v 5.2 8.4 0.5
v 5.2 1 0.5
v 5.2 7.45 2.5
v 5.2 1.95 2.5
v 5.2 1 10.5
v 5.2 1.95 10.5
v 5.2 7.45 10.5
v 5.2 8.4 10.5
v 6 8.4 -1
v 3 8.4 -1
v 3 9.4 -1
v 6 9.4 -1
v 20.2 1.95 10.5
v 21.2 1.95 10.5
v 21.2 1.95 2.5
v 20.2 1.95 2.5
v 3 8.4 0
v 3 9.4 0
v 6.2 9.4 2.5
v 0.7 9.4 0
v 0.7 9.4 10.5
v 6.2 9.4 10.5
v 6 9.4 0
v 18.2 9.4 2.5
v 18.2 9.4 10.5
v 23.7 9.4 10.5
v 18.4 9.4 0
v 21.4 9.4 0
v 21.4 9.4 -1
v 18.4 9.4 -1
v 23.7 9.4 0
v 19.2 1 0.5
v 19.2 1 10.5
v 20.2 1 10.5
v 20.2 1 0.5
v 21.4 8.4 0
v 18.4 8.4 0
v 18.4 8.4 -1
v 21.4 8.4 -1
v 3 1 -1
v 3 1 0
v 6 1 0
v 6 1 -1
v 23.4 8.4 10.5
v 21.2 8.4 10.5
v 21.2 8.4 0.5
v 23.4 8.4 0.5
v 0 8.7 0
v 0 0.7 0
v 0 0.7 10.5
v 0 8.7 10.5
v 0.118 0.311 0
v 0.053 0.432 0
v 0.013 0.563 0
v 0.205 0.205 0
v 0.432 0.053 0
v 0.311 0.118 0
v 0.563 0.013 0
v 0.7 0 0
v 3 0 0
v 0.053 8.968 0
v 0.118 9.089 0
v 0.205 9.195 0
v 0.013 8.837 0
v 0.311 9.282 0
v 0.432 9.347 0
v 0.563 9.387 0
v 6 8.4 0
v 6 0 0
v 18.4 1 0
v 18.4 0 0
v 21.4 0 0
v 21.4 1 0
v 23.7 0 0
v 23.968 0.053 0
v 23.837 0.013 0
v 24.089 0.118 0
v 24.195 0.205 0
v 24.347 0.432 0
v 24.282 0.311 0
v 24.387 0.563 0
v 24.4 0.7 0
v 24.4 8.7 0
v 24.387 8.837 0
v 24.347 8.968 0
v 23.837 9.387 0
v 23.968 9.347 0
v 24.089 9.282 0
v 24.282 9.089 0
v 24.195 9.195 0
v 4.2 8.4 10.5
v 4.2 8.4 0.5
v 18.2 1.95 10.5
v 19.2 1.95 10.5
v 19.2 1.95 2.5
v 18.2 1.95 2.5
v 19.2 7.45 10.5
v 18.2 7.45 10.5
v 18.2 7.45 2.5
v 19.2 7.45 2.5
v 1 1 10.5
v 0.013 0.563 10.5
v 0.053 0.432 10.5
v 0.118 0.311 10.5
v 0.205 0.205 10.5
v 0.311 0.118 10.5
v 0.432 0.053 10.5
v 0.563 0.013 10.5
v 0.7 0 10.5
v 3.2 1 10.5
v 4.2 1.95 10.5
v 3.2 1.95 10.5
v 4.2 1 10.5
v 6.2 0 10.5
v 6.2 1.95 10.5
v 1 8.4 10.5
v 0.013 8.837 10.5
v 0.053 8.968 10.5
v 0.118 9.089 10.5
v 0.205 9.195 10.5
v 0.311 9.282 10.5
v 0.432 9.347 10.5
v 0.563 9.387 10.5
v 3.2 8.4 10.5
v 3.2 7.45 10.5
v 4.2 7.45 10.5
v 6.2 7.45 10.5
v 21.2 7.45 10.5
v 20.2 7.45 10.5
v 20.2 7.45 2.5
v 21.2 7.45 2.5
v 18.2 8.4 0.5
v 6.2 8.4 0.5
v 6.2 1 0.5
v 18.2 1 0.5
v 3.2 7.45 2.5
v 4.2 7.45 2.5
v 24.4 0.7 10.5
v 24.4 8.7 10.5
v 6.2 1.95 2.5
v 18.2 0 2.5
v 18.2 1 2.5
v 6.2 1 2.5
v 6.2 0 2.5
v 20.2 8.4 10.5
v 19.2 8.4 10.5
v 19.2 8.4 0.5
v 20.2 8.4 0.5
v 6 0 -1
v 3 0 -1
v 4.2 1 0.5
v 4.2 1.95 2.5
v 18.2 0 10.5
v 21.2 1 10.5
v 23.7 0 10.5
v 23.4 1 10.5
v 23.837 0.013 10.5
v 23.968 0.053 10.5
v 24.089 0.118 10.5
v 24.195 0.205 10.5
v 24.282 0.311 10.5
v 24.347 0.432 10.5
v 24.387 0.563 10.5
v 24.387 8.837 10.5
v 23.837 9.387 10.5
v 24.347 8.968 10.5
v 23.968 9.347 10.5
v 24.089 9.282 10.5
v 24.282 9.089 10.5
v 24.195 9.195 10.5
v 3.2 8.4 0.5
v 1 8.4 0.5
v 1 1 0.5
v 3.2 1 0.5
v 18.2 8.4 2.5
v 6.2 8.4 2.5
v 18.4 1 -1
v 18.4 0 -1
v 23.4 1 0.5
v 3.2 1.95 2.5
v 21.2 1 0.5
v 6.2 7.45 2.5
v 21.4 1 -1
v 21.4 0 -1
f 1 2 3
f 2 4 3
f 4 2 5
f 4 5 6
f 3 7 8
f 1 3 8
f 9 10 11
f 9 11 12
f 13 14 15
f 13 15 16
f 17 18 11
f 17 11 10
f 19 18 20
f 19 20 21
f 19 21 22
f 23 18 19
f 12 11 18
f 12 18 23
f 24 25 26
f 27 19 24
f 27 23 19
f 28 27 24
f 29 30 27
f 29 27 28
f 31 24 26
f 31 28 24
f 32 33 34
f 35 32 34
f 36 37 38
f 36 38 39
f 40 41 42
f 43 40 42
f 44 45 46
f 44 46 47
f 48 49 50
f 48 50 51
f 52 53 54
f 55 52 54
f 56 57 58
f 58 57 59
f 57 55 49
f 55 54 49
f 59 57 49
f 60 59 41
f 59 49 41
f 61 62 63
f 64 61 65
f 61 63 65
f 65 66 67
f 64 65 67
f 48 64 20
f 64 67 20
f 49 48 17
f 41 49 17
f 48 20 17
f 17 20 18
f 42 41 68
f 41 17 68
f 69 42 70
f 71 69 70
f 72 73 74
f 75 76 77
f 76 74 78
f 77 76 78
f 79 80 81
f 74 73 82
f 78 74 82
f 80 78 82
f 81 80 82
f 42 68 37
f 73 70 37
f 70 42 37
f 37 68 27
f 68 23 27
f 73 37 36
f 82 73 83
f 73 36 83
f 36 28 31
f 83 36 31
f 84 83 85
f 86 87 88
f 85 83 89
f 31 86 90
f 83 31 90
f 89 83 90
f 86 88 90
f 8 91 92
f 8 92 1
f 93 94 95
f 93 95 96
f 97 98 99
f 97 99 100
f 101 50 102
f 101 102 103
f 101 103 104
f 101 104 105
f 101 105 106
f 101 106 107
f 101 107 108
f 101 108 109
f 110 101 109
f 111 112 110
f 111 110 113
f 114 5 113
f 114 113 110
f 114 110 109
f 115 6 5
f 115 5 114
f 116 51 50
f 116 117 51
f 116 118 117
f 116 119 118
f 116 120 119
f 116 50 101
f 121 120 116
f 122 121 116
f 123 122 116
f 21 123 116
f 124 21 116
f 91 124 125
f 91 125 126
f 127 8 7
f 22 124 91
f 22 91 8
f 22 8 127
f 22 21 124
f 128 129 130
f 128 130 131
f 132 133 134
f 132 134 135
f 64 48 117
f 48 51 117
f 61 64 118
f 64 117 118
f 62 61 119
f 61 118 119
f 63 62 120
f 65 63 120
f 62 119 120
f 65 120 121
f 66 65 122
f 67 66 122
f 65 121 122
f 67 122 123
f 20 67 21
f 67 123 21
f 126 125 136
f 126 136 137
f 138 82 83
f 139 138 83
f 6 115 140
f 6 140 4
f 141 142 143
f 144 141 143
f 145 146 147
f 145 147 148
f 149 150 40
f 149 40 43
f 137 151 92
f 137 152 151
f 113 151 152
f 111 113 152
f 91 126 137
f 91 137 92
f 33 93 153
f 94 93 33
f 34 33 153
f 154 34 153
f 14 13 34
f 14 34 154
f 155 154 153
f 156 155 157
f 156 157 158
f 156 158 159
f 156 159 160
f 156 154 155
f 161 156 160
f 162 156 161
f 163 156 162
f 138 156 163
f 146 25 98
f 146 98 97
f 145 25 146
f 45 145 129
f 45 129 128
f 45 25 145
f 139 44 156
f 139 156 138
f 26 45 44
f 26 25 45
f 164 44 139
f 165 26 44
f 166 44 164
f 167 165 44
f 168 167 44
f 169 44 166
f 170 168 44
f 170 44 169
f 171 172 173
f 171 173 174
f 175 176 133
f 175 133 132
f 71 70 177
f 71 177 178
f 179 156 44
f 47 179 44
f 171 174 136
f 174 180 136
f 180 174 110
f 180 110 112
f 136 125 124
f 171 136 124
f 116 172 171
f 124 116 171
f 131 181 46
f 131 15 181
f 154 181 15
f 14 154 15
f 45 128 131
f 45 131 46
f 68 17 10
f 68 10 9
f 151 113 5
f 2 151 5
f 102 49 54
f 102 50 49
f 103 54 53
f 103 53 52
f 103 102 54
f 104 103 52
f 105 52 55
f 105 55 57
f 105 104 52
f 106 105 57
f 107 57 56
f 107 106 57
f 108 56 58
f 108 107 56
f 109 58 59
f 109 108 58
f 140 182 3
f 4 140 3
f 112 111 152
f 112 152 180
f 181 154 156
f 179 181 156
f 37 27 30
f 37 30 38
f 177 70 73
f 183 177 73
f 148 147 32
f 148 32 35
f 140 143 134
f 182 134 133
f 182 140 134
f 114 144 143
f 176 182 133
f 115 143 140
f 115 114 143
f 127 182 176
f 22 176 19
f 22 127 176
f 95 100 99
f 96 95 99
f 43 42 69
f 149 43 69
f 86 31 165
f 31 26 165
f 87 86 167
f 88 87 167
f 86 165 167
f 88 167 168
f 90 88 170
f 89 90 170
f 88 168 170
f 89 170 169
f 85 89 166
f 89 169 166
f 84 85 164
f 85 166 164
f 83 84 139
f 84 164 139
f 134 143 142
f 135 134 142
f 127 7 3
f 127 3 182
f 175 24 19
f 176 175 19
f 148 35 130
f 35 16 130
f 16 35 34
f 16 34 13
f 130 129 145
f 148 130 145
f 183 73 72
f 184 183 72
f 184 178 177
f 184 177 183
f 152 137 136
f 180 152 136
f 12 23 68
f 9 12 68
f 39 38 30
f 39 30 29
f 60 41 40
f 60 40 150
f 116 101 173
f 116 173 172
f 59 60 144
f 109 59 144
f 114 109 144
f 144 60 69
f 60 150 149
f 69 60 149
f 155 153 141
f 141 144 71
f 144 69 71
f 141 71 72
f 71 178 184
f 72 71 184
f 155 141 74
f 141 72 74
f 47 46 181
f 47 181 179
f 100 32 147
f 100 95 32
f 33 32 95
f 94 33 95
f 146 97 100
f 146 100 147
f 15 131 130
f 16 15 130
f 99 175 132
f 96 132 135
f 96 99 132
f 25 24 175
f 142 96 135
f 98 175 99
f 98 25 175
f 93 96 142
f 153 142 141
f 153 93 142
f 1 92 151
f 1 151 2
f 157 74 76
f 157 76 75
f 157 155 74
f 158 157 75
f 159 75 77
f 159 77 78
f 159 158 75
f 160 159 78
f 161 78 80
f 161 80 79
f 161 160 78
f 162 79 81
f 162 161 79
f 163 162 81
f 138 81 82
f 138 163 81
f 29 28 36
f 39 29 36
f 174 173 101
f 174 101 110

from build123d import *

# Parameters (mm, degrees)
SKETCH_W        = 24.4
SKETCH_H        = 9.4
PAD_DEPTH       = 10.5
SKETCH001_W     = 2.2
SKETCH001_H     = 7.4
SKETCH001_W_2   = 12
SKETCH001_W_3   = 1
POCKET_DEPTH    = 10
POCKET001_DEPTH = 8
SKETCH003_W     = 3
SKETCH003_H     = 1
PAD001_DEPTH    = 1
FILLET_R        = 0.7


with BuildPart() as part:
    # Sketch → Pad (new body)
    with BuildSketch(Plane.XY):
        with Locations((12.2, 4.7)):
            Rectangle(SKETCH_W, SKETCH_H)
    extrude(amount=PAD_DEPTH)

    # Sketch001 (on Face6 of Pad) → Pocket (cut)
    with BuildSketch(Plane.XY.offset(10.5)):
        with Locations((22.3, 4.7)):
            Rectangle(SKETCH001_W, SKETCH001_H)
        with Locations((2.1, 4.7)):
            Rectangle(SKETCH001_W, SKETCH001_H)
        with Locations((12.2, 4.7)):
            Rectangle(SKETCH001_W_2, SKETCH001_H)
        with Locations((4.7, 4.7)):
            Rectangle(SKETCH001_W_3, SKETCH001_H)
        with Locations((19.7, 4.7)):
            Rectangle(SKETCH001_W_3, SKETCH001_H)
    extrude(amount=-POCKET_DEPTH, mode=Mode.SUBTRACT)

    # Sketch002 (on Face5 of Pocket) → Pocket001 (cut)
    with BuildSketch(Plane.XY.offset(10.5)):
        Polygon((6.2, 9.4), (18.2, 9.4), (18.2, 7.45), (22.2, 7.45), (22.2, 1.95), (18.2, 1.95), (18.2, 0), (6.2, 0), (6.2, 1.95), (2.2, 1.95), (2.2, 7.45), (6.2, 7.45), align=None)
    extrude(amount=-POCKET001_DEPTH, mode=Mode.SUBTRACT)

    # Sketch003 (on Face2 of Pocket001) → Pad001 (join)
    with BuildSketch(Plane(origin=(0, 0, 0), x_dir=(1, 0, 0), z_dir=(0, 0, -1))):
        with Locations((4.5, -0.5)):
            Rectangle(SKETCH003_W, SKETCH003_H)
        with Locations((19.9, -0.5)):
            Rectangle(SKETCH003_W, SKETCH003_H)
        with Locations((4.5, -8.9)):
            Rectangle(SKETCH003_W, SKETCH003_H)
        with Locations((19.9, -8.9)):
            Rectangle(SKETCH003_W, SKETCH003_H)
    extrude(amount=PAD001_DEPTH)

    # Fillet
    fillet_edges = [part.edges().sort_by_distance(p)[0] for p in [
        (24.4, 0, 5.25),
        (0, 0, 5.25),
        (24.4, 9.4, 5.25),
        (0, 9.4, 5.25),
    ]]
    fillet(fillet_edges, radius=FILLET_R)


solid = part.part
